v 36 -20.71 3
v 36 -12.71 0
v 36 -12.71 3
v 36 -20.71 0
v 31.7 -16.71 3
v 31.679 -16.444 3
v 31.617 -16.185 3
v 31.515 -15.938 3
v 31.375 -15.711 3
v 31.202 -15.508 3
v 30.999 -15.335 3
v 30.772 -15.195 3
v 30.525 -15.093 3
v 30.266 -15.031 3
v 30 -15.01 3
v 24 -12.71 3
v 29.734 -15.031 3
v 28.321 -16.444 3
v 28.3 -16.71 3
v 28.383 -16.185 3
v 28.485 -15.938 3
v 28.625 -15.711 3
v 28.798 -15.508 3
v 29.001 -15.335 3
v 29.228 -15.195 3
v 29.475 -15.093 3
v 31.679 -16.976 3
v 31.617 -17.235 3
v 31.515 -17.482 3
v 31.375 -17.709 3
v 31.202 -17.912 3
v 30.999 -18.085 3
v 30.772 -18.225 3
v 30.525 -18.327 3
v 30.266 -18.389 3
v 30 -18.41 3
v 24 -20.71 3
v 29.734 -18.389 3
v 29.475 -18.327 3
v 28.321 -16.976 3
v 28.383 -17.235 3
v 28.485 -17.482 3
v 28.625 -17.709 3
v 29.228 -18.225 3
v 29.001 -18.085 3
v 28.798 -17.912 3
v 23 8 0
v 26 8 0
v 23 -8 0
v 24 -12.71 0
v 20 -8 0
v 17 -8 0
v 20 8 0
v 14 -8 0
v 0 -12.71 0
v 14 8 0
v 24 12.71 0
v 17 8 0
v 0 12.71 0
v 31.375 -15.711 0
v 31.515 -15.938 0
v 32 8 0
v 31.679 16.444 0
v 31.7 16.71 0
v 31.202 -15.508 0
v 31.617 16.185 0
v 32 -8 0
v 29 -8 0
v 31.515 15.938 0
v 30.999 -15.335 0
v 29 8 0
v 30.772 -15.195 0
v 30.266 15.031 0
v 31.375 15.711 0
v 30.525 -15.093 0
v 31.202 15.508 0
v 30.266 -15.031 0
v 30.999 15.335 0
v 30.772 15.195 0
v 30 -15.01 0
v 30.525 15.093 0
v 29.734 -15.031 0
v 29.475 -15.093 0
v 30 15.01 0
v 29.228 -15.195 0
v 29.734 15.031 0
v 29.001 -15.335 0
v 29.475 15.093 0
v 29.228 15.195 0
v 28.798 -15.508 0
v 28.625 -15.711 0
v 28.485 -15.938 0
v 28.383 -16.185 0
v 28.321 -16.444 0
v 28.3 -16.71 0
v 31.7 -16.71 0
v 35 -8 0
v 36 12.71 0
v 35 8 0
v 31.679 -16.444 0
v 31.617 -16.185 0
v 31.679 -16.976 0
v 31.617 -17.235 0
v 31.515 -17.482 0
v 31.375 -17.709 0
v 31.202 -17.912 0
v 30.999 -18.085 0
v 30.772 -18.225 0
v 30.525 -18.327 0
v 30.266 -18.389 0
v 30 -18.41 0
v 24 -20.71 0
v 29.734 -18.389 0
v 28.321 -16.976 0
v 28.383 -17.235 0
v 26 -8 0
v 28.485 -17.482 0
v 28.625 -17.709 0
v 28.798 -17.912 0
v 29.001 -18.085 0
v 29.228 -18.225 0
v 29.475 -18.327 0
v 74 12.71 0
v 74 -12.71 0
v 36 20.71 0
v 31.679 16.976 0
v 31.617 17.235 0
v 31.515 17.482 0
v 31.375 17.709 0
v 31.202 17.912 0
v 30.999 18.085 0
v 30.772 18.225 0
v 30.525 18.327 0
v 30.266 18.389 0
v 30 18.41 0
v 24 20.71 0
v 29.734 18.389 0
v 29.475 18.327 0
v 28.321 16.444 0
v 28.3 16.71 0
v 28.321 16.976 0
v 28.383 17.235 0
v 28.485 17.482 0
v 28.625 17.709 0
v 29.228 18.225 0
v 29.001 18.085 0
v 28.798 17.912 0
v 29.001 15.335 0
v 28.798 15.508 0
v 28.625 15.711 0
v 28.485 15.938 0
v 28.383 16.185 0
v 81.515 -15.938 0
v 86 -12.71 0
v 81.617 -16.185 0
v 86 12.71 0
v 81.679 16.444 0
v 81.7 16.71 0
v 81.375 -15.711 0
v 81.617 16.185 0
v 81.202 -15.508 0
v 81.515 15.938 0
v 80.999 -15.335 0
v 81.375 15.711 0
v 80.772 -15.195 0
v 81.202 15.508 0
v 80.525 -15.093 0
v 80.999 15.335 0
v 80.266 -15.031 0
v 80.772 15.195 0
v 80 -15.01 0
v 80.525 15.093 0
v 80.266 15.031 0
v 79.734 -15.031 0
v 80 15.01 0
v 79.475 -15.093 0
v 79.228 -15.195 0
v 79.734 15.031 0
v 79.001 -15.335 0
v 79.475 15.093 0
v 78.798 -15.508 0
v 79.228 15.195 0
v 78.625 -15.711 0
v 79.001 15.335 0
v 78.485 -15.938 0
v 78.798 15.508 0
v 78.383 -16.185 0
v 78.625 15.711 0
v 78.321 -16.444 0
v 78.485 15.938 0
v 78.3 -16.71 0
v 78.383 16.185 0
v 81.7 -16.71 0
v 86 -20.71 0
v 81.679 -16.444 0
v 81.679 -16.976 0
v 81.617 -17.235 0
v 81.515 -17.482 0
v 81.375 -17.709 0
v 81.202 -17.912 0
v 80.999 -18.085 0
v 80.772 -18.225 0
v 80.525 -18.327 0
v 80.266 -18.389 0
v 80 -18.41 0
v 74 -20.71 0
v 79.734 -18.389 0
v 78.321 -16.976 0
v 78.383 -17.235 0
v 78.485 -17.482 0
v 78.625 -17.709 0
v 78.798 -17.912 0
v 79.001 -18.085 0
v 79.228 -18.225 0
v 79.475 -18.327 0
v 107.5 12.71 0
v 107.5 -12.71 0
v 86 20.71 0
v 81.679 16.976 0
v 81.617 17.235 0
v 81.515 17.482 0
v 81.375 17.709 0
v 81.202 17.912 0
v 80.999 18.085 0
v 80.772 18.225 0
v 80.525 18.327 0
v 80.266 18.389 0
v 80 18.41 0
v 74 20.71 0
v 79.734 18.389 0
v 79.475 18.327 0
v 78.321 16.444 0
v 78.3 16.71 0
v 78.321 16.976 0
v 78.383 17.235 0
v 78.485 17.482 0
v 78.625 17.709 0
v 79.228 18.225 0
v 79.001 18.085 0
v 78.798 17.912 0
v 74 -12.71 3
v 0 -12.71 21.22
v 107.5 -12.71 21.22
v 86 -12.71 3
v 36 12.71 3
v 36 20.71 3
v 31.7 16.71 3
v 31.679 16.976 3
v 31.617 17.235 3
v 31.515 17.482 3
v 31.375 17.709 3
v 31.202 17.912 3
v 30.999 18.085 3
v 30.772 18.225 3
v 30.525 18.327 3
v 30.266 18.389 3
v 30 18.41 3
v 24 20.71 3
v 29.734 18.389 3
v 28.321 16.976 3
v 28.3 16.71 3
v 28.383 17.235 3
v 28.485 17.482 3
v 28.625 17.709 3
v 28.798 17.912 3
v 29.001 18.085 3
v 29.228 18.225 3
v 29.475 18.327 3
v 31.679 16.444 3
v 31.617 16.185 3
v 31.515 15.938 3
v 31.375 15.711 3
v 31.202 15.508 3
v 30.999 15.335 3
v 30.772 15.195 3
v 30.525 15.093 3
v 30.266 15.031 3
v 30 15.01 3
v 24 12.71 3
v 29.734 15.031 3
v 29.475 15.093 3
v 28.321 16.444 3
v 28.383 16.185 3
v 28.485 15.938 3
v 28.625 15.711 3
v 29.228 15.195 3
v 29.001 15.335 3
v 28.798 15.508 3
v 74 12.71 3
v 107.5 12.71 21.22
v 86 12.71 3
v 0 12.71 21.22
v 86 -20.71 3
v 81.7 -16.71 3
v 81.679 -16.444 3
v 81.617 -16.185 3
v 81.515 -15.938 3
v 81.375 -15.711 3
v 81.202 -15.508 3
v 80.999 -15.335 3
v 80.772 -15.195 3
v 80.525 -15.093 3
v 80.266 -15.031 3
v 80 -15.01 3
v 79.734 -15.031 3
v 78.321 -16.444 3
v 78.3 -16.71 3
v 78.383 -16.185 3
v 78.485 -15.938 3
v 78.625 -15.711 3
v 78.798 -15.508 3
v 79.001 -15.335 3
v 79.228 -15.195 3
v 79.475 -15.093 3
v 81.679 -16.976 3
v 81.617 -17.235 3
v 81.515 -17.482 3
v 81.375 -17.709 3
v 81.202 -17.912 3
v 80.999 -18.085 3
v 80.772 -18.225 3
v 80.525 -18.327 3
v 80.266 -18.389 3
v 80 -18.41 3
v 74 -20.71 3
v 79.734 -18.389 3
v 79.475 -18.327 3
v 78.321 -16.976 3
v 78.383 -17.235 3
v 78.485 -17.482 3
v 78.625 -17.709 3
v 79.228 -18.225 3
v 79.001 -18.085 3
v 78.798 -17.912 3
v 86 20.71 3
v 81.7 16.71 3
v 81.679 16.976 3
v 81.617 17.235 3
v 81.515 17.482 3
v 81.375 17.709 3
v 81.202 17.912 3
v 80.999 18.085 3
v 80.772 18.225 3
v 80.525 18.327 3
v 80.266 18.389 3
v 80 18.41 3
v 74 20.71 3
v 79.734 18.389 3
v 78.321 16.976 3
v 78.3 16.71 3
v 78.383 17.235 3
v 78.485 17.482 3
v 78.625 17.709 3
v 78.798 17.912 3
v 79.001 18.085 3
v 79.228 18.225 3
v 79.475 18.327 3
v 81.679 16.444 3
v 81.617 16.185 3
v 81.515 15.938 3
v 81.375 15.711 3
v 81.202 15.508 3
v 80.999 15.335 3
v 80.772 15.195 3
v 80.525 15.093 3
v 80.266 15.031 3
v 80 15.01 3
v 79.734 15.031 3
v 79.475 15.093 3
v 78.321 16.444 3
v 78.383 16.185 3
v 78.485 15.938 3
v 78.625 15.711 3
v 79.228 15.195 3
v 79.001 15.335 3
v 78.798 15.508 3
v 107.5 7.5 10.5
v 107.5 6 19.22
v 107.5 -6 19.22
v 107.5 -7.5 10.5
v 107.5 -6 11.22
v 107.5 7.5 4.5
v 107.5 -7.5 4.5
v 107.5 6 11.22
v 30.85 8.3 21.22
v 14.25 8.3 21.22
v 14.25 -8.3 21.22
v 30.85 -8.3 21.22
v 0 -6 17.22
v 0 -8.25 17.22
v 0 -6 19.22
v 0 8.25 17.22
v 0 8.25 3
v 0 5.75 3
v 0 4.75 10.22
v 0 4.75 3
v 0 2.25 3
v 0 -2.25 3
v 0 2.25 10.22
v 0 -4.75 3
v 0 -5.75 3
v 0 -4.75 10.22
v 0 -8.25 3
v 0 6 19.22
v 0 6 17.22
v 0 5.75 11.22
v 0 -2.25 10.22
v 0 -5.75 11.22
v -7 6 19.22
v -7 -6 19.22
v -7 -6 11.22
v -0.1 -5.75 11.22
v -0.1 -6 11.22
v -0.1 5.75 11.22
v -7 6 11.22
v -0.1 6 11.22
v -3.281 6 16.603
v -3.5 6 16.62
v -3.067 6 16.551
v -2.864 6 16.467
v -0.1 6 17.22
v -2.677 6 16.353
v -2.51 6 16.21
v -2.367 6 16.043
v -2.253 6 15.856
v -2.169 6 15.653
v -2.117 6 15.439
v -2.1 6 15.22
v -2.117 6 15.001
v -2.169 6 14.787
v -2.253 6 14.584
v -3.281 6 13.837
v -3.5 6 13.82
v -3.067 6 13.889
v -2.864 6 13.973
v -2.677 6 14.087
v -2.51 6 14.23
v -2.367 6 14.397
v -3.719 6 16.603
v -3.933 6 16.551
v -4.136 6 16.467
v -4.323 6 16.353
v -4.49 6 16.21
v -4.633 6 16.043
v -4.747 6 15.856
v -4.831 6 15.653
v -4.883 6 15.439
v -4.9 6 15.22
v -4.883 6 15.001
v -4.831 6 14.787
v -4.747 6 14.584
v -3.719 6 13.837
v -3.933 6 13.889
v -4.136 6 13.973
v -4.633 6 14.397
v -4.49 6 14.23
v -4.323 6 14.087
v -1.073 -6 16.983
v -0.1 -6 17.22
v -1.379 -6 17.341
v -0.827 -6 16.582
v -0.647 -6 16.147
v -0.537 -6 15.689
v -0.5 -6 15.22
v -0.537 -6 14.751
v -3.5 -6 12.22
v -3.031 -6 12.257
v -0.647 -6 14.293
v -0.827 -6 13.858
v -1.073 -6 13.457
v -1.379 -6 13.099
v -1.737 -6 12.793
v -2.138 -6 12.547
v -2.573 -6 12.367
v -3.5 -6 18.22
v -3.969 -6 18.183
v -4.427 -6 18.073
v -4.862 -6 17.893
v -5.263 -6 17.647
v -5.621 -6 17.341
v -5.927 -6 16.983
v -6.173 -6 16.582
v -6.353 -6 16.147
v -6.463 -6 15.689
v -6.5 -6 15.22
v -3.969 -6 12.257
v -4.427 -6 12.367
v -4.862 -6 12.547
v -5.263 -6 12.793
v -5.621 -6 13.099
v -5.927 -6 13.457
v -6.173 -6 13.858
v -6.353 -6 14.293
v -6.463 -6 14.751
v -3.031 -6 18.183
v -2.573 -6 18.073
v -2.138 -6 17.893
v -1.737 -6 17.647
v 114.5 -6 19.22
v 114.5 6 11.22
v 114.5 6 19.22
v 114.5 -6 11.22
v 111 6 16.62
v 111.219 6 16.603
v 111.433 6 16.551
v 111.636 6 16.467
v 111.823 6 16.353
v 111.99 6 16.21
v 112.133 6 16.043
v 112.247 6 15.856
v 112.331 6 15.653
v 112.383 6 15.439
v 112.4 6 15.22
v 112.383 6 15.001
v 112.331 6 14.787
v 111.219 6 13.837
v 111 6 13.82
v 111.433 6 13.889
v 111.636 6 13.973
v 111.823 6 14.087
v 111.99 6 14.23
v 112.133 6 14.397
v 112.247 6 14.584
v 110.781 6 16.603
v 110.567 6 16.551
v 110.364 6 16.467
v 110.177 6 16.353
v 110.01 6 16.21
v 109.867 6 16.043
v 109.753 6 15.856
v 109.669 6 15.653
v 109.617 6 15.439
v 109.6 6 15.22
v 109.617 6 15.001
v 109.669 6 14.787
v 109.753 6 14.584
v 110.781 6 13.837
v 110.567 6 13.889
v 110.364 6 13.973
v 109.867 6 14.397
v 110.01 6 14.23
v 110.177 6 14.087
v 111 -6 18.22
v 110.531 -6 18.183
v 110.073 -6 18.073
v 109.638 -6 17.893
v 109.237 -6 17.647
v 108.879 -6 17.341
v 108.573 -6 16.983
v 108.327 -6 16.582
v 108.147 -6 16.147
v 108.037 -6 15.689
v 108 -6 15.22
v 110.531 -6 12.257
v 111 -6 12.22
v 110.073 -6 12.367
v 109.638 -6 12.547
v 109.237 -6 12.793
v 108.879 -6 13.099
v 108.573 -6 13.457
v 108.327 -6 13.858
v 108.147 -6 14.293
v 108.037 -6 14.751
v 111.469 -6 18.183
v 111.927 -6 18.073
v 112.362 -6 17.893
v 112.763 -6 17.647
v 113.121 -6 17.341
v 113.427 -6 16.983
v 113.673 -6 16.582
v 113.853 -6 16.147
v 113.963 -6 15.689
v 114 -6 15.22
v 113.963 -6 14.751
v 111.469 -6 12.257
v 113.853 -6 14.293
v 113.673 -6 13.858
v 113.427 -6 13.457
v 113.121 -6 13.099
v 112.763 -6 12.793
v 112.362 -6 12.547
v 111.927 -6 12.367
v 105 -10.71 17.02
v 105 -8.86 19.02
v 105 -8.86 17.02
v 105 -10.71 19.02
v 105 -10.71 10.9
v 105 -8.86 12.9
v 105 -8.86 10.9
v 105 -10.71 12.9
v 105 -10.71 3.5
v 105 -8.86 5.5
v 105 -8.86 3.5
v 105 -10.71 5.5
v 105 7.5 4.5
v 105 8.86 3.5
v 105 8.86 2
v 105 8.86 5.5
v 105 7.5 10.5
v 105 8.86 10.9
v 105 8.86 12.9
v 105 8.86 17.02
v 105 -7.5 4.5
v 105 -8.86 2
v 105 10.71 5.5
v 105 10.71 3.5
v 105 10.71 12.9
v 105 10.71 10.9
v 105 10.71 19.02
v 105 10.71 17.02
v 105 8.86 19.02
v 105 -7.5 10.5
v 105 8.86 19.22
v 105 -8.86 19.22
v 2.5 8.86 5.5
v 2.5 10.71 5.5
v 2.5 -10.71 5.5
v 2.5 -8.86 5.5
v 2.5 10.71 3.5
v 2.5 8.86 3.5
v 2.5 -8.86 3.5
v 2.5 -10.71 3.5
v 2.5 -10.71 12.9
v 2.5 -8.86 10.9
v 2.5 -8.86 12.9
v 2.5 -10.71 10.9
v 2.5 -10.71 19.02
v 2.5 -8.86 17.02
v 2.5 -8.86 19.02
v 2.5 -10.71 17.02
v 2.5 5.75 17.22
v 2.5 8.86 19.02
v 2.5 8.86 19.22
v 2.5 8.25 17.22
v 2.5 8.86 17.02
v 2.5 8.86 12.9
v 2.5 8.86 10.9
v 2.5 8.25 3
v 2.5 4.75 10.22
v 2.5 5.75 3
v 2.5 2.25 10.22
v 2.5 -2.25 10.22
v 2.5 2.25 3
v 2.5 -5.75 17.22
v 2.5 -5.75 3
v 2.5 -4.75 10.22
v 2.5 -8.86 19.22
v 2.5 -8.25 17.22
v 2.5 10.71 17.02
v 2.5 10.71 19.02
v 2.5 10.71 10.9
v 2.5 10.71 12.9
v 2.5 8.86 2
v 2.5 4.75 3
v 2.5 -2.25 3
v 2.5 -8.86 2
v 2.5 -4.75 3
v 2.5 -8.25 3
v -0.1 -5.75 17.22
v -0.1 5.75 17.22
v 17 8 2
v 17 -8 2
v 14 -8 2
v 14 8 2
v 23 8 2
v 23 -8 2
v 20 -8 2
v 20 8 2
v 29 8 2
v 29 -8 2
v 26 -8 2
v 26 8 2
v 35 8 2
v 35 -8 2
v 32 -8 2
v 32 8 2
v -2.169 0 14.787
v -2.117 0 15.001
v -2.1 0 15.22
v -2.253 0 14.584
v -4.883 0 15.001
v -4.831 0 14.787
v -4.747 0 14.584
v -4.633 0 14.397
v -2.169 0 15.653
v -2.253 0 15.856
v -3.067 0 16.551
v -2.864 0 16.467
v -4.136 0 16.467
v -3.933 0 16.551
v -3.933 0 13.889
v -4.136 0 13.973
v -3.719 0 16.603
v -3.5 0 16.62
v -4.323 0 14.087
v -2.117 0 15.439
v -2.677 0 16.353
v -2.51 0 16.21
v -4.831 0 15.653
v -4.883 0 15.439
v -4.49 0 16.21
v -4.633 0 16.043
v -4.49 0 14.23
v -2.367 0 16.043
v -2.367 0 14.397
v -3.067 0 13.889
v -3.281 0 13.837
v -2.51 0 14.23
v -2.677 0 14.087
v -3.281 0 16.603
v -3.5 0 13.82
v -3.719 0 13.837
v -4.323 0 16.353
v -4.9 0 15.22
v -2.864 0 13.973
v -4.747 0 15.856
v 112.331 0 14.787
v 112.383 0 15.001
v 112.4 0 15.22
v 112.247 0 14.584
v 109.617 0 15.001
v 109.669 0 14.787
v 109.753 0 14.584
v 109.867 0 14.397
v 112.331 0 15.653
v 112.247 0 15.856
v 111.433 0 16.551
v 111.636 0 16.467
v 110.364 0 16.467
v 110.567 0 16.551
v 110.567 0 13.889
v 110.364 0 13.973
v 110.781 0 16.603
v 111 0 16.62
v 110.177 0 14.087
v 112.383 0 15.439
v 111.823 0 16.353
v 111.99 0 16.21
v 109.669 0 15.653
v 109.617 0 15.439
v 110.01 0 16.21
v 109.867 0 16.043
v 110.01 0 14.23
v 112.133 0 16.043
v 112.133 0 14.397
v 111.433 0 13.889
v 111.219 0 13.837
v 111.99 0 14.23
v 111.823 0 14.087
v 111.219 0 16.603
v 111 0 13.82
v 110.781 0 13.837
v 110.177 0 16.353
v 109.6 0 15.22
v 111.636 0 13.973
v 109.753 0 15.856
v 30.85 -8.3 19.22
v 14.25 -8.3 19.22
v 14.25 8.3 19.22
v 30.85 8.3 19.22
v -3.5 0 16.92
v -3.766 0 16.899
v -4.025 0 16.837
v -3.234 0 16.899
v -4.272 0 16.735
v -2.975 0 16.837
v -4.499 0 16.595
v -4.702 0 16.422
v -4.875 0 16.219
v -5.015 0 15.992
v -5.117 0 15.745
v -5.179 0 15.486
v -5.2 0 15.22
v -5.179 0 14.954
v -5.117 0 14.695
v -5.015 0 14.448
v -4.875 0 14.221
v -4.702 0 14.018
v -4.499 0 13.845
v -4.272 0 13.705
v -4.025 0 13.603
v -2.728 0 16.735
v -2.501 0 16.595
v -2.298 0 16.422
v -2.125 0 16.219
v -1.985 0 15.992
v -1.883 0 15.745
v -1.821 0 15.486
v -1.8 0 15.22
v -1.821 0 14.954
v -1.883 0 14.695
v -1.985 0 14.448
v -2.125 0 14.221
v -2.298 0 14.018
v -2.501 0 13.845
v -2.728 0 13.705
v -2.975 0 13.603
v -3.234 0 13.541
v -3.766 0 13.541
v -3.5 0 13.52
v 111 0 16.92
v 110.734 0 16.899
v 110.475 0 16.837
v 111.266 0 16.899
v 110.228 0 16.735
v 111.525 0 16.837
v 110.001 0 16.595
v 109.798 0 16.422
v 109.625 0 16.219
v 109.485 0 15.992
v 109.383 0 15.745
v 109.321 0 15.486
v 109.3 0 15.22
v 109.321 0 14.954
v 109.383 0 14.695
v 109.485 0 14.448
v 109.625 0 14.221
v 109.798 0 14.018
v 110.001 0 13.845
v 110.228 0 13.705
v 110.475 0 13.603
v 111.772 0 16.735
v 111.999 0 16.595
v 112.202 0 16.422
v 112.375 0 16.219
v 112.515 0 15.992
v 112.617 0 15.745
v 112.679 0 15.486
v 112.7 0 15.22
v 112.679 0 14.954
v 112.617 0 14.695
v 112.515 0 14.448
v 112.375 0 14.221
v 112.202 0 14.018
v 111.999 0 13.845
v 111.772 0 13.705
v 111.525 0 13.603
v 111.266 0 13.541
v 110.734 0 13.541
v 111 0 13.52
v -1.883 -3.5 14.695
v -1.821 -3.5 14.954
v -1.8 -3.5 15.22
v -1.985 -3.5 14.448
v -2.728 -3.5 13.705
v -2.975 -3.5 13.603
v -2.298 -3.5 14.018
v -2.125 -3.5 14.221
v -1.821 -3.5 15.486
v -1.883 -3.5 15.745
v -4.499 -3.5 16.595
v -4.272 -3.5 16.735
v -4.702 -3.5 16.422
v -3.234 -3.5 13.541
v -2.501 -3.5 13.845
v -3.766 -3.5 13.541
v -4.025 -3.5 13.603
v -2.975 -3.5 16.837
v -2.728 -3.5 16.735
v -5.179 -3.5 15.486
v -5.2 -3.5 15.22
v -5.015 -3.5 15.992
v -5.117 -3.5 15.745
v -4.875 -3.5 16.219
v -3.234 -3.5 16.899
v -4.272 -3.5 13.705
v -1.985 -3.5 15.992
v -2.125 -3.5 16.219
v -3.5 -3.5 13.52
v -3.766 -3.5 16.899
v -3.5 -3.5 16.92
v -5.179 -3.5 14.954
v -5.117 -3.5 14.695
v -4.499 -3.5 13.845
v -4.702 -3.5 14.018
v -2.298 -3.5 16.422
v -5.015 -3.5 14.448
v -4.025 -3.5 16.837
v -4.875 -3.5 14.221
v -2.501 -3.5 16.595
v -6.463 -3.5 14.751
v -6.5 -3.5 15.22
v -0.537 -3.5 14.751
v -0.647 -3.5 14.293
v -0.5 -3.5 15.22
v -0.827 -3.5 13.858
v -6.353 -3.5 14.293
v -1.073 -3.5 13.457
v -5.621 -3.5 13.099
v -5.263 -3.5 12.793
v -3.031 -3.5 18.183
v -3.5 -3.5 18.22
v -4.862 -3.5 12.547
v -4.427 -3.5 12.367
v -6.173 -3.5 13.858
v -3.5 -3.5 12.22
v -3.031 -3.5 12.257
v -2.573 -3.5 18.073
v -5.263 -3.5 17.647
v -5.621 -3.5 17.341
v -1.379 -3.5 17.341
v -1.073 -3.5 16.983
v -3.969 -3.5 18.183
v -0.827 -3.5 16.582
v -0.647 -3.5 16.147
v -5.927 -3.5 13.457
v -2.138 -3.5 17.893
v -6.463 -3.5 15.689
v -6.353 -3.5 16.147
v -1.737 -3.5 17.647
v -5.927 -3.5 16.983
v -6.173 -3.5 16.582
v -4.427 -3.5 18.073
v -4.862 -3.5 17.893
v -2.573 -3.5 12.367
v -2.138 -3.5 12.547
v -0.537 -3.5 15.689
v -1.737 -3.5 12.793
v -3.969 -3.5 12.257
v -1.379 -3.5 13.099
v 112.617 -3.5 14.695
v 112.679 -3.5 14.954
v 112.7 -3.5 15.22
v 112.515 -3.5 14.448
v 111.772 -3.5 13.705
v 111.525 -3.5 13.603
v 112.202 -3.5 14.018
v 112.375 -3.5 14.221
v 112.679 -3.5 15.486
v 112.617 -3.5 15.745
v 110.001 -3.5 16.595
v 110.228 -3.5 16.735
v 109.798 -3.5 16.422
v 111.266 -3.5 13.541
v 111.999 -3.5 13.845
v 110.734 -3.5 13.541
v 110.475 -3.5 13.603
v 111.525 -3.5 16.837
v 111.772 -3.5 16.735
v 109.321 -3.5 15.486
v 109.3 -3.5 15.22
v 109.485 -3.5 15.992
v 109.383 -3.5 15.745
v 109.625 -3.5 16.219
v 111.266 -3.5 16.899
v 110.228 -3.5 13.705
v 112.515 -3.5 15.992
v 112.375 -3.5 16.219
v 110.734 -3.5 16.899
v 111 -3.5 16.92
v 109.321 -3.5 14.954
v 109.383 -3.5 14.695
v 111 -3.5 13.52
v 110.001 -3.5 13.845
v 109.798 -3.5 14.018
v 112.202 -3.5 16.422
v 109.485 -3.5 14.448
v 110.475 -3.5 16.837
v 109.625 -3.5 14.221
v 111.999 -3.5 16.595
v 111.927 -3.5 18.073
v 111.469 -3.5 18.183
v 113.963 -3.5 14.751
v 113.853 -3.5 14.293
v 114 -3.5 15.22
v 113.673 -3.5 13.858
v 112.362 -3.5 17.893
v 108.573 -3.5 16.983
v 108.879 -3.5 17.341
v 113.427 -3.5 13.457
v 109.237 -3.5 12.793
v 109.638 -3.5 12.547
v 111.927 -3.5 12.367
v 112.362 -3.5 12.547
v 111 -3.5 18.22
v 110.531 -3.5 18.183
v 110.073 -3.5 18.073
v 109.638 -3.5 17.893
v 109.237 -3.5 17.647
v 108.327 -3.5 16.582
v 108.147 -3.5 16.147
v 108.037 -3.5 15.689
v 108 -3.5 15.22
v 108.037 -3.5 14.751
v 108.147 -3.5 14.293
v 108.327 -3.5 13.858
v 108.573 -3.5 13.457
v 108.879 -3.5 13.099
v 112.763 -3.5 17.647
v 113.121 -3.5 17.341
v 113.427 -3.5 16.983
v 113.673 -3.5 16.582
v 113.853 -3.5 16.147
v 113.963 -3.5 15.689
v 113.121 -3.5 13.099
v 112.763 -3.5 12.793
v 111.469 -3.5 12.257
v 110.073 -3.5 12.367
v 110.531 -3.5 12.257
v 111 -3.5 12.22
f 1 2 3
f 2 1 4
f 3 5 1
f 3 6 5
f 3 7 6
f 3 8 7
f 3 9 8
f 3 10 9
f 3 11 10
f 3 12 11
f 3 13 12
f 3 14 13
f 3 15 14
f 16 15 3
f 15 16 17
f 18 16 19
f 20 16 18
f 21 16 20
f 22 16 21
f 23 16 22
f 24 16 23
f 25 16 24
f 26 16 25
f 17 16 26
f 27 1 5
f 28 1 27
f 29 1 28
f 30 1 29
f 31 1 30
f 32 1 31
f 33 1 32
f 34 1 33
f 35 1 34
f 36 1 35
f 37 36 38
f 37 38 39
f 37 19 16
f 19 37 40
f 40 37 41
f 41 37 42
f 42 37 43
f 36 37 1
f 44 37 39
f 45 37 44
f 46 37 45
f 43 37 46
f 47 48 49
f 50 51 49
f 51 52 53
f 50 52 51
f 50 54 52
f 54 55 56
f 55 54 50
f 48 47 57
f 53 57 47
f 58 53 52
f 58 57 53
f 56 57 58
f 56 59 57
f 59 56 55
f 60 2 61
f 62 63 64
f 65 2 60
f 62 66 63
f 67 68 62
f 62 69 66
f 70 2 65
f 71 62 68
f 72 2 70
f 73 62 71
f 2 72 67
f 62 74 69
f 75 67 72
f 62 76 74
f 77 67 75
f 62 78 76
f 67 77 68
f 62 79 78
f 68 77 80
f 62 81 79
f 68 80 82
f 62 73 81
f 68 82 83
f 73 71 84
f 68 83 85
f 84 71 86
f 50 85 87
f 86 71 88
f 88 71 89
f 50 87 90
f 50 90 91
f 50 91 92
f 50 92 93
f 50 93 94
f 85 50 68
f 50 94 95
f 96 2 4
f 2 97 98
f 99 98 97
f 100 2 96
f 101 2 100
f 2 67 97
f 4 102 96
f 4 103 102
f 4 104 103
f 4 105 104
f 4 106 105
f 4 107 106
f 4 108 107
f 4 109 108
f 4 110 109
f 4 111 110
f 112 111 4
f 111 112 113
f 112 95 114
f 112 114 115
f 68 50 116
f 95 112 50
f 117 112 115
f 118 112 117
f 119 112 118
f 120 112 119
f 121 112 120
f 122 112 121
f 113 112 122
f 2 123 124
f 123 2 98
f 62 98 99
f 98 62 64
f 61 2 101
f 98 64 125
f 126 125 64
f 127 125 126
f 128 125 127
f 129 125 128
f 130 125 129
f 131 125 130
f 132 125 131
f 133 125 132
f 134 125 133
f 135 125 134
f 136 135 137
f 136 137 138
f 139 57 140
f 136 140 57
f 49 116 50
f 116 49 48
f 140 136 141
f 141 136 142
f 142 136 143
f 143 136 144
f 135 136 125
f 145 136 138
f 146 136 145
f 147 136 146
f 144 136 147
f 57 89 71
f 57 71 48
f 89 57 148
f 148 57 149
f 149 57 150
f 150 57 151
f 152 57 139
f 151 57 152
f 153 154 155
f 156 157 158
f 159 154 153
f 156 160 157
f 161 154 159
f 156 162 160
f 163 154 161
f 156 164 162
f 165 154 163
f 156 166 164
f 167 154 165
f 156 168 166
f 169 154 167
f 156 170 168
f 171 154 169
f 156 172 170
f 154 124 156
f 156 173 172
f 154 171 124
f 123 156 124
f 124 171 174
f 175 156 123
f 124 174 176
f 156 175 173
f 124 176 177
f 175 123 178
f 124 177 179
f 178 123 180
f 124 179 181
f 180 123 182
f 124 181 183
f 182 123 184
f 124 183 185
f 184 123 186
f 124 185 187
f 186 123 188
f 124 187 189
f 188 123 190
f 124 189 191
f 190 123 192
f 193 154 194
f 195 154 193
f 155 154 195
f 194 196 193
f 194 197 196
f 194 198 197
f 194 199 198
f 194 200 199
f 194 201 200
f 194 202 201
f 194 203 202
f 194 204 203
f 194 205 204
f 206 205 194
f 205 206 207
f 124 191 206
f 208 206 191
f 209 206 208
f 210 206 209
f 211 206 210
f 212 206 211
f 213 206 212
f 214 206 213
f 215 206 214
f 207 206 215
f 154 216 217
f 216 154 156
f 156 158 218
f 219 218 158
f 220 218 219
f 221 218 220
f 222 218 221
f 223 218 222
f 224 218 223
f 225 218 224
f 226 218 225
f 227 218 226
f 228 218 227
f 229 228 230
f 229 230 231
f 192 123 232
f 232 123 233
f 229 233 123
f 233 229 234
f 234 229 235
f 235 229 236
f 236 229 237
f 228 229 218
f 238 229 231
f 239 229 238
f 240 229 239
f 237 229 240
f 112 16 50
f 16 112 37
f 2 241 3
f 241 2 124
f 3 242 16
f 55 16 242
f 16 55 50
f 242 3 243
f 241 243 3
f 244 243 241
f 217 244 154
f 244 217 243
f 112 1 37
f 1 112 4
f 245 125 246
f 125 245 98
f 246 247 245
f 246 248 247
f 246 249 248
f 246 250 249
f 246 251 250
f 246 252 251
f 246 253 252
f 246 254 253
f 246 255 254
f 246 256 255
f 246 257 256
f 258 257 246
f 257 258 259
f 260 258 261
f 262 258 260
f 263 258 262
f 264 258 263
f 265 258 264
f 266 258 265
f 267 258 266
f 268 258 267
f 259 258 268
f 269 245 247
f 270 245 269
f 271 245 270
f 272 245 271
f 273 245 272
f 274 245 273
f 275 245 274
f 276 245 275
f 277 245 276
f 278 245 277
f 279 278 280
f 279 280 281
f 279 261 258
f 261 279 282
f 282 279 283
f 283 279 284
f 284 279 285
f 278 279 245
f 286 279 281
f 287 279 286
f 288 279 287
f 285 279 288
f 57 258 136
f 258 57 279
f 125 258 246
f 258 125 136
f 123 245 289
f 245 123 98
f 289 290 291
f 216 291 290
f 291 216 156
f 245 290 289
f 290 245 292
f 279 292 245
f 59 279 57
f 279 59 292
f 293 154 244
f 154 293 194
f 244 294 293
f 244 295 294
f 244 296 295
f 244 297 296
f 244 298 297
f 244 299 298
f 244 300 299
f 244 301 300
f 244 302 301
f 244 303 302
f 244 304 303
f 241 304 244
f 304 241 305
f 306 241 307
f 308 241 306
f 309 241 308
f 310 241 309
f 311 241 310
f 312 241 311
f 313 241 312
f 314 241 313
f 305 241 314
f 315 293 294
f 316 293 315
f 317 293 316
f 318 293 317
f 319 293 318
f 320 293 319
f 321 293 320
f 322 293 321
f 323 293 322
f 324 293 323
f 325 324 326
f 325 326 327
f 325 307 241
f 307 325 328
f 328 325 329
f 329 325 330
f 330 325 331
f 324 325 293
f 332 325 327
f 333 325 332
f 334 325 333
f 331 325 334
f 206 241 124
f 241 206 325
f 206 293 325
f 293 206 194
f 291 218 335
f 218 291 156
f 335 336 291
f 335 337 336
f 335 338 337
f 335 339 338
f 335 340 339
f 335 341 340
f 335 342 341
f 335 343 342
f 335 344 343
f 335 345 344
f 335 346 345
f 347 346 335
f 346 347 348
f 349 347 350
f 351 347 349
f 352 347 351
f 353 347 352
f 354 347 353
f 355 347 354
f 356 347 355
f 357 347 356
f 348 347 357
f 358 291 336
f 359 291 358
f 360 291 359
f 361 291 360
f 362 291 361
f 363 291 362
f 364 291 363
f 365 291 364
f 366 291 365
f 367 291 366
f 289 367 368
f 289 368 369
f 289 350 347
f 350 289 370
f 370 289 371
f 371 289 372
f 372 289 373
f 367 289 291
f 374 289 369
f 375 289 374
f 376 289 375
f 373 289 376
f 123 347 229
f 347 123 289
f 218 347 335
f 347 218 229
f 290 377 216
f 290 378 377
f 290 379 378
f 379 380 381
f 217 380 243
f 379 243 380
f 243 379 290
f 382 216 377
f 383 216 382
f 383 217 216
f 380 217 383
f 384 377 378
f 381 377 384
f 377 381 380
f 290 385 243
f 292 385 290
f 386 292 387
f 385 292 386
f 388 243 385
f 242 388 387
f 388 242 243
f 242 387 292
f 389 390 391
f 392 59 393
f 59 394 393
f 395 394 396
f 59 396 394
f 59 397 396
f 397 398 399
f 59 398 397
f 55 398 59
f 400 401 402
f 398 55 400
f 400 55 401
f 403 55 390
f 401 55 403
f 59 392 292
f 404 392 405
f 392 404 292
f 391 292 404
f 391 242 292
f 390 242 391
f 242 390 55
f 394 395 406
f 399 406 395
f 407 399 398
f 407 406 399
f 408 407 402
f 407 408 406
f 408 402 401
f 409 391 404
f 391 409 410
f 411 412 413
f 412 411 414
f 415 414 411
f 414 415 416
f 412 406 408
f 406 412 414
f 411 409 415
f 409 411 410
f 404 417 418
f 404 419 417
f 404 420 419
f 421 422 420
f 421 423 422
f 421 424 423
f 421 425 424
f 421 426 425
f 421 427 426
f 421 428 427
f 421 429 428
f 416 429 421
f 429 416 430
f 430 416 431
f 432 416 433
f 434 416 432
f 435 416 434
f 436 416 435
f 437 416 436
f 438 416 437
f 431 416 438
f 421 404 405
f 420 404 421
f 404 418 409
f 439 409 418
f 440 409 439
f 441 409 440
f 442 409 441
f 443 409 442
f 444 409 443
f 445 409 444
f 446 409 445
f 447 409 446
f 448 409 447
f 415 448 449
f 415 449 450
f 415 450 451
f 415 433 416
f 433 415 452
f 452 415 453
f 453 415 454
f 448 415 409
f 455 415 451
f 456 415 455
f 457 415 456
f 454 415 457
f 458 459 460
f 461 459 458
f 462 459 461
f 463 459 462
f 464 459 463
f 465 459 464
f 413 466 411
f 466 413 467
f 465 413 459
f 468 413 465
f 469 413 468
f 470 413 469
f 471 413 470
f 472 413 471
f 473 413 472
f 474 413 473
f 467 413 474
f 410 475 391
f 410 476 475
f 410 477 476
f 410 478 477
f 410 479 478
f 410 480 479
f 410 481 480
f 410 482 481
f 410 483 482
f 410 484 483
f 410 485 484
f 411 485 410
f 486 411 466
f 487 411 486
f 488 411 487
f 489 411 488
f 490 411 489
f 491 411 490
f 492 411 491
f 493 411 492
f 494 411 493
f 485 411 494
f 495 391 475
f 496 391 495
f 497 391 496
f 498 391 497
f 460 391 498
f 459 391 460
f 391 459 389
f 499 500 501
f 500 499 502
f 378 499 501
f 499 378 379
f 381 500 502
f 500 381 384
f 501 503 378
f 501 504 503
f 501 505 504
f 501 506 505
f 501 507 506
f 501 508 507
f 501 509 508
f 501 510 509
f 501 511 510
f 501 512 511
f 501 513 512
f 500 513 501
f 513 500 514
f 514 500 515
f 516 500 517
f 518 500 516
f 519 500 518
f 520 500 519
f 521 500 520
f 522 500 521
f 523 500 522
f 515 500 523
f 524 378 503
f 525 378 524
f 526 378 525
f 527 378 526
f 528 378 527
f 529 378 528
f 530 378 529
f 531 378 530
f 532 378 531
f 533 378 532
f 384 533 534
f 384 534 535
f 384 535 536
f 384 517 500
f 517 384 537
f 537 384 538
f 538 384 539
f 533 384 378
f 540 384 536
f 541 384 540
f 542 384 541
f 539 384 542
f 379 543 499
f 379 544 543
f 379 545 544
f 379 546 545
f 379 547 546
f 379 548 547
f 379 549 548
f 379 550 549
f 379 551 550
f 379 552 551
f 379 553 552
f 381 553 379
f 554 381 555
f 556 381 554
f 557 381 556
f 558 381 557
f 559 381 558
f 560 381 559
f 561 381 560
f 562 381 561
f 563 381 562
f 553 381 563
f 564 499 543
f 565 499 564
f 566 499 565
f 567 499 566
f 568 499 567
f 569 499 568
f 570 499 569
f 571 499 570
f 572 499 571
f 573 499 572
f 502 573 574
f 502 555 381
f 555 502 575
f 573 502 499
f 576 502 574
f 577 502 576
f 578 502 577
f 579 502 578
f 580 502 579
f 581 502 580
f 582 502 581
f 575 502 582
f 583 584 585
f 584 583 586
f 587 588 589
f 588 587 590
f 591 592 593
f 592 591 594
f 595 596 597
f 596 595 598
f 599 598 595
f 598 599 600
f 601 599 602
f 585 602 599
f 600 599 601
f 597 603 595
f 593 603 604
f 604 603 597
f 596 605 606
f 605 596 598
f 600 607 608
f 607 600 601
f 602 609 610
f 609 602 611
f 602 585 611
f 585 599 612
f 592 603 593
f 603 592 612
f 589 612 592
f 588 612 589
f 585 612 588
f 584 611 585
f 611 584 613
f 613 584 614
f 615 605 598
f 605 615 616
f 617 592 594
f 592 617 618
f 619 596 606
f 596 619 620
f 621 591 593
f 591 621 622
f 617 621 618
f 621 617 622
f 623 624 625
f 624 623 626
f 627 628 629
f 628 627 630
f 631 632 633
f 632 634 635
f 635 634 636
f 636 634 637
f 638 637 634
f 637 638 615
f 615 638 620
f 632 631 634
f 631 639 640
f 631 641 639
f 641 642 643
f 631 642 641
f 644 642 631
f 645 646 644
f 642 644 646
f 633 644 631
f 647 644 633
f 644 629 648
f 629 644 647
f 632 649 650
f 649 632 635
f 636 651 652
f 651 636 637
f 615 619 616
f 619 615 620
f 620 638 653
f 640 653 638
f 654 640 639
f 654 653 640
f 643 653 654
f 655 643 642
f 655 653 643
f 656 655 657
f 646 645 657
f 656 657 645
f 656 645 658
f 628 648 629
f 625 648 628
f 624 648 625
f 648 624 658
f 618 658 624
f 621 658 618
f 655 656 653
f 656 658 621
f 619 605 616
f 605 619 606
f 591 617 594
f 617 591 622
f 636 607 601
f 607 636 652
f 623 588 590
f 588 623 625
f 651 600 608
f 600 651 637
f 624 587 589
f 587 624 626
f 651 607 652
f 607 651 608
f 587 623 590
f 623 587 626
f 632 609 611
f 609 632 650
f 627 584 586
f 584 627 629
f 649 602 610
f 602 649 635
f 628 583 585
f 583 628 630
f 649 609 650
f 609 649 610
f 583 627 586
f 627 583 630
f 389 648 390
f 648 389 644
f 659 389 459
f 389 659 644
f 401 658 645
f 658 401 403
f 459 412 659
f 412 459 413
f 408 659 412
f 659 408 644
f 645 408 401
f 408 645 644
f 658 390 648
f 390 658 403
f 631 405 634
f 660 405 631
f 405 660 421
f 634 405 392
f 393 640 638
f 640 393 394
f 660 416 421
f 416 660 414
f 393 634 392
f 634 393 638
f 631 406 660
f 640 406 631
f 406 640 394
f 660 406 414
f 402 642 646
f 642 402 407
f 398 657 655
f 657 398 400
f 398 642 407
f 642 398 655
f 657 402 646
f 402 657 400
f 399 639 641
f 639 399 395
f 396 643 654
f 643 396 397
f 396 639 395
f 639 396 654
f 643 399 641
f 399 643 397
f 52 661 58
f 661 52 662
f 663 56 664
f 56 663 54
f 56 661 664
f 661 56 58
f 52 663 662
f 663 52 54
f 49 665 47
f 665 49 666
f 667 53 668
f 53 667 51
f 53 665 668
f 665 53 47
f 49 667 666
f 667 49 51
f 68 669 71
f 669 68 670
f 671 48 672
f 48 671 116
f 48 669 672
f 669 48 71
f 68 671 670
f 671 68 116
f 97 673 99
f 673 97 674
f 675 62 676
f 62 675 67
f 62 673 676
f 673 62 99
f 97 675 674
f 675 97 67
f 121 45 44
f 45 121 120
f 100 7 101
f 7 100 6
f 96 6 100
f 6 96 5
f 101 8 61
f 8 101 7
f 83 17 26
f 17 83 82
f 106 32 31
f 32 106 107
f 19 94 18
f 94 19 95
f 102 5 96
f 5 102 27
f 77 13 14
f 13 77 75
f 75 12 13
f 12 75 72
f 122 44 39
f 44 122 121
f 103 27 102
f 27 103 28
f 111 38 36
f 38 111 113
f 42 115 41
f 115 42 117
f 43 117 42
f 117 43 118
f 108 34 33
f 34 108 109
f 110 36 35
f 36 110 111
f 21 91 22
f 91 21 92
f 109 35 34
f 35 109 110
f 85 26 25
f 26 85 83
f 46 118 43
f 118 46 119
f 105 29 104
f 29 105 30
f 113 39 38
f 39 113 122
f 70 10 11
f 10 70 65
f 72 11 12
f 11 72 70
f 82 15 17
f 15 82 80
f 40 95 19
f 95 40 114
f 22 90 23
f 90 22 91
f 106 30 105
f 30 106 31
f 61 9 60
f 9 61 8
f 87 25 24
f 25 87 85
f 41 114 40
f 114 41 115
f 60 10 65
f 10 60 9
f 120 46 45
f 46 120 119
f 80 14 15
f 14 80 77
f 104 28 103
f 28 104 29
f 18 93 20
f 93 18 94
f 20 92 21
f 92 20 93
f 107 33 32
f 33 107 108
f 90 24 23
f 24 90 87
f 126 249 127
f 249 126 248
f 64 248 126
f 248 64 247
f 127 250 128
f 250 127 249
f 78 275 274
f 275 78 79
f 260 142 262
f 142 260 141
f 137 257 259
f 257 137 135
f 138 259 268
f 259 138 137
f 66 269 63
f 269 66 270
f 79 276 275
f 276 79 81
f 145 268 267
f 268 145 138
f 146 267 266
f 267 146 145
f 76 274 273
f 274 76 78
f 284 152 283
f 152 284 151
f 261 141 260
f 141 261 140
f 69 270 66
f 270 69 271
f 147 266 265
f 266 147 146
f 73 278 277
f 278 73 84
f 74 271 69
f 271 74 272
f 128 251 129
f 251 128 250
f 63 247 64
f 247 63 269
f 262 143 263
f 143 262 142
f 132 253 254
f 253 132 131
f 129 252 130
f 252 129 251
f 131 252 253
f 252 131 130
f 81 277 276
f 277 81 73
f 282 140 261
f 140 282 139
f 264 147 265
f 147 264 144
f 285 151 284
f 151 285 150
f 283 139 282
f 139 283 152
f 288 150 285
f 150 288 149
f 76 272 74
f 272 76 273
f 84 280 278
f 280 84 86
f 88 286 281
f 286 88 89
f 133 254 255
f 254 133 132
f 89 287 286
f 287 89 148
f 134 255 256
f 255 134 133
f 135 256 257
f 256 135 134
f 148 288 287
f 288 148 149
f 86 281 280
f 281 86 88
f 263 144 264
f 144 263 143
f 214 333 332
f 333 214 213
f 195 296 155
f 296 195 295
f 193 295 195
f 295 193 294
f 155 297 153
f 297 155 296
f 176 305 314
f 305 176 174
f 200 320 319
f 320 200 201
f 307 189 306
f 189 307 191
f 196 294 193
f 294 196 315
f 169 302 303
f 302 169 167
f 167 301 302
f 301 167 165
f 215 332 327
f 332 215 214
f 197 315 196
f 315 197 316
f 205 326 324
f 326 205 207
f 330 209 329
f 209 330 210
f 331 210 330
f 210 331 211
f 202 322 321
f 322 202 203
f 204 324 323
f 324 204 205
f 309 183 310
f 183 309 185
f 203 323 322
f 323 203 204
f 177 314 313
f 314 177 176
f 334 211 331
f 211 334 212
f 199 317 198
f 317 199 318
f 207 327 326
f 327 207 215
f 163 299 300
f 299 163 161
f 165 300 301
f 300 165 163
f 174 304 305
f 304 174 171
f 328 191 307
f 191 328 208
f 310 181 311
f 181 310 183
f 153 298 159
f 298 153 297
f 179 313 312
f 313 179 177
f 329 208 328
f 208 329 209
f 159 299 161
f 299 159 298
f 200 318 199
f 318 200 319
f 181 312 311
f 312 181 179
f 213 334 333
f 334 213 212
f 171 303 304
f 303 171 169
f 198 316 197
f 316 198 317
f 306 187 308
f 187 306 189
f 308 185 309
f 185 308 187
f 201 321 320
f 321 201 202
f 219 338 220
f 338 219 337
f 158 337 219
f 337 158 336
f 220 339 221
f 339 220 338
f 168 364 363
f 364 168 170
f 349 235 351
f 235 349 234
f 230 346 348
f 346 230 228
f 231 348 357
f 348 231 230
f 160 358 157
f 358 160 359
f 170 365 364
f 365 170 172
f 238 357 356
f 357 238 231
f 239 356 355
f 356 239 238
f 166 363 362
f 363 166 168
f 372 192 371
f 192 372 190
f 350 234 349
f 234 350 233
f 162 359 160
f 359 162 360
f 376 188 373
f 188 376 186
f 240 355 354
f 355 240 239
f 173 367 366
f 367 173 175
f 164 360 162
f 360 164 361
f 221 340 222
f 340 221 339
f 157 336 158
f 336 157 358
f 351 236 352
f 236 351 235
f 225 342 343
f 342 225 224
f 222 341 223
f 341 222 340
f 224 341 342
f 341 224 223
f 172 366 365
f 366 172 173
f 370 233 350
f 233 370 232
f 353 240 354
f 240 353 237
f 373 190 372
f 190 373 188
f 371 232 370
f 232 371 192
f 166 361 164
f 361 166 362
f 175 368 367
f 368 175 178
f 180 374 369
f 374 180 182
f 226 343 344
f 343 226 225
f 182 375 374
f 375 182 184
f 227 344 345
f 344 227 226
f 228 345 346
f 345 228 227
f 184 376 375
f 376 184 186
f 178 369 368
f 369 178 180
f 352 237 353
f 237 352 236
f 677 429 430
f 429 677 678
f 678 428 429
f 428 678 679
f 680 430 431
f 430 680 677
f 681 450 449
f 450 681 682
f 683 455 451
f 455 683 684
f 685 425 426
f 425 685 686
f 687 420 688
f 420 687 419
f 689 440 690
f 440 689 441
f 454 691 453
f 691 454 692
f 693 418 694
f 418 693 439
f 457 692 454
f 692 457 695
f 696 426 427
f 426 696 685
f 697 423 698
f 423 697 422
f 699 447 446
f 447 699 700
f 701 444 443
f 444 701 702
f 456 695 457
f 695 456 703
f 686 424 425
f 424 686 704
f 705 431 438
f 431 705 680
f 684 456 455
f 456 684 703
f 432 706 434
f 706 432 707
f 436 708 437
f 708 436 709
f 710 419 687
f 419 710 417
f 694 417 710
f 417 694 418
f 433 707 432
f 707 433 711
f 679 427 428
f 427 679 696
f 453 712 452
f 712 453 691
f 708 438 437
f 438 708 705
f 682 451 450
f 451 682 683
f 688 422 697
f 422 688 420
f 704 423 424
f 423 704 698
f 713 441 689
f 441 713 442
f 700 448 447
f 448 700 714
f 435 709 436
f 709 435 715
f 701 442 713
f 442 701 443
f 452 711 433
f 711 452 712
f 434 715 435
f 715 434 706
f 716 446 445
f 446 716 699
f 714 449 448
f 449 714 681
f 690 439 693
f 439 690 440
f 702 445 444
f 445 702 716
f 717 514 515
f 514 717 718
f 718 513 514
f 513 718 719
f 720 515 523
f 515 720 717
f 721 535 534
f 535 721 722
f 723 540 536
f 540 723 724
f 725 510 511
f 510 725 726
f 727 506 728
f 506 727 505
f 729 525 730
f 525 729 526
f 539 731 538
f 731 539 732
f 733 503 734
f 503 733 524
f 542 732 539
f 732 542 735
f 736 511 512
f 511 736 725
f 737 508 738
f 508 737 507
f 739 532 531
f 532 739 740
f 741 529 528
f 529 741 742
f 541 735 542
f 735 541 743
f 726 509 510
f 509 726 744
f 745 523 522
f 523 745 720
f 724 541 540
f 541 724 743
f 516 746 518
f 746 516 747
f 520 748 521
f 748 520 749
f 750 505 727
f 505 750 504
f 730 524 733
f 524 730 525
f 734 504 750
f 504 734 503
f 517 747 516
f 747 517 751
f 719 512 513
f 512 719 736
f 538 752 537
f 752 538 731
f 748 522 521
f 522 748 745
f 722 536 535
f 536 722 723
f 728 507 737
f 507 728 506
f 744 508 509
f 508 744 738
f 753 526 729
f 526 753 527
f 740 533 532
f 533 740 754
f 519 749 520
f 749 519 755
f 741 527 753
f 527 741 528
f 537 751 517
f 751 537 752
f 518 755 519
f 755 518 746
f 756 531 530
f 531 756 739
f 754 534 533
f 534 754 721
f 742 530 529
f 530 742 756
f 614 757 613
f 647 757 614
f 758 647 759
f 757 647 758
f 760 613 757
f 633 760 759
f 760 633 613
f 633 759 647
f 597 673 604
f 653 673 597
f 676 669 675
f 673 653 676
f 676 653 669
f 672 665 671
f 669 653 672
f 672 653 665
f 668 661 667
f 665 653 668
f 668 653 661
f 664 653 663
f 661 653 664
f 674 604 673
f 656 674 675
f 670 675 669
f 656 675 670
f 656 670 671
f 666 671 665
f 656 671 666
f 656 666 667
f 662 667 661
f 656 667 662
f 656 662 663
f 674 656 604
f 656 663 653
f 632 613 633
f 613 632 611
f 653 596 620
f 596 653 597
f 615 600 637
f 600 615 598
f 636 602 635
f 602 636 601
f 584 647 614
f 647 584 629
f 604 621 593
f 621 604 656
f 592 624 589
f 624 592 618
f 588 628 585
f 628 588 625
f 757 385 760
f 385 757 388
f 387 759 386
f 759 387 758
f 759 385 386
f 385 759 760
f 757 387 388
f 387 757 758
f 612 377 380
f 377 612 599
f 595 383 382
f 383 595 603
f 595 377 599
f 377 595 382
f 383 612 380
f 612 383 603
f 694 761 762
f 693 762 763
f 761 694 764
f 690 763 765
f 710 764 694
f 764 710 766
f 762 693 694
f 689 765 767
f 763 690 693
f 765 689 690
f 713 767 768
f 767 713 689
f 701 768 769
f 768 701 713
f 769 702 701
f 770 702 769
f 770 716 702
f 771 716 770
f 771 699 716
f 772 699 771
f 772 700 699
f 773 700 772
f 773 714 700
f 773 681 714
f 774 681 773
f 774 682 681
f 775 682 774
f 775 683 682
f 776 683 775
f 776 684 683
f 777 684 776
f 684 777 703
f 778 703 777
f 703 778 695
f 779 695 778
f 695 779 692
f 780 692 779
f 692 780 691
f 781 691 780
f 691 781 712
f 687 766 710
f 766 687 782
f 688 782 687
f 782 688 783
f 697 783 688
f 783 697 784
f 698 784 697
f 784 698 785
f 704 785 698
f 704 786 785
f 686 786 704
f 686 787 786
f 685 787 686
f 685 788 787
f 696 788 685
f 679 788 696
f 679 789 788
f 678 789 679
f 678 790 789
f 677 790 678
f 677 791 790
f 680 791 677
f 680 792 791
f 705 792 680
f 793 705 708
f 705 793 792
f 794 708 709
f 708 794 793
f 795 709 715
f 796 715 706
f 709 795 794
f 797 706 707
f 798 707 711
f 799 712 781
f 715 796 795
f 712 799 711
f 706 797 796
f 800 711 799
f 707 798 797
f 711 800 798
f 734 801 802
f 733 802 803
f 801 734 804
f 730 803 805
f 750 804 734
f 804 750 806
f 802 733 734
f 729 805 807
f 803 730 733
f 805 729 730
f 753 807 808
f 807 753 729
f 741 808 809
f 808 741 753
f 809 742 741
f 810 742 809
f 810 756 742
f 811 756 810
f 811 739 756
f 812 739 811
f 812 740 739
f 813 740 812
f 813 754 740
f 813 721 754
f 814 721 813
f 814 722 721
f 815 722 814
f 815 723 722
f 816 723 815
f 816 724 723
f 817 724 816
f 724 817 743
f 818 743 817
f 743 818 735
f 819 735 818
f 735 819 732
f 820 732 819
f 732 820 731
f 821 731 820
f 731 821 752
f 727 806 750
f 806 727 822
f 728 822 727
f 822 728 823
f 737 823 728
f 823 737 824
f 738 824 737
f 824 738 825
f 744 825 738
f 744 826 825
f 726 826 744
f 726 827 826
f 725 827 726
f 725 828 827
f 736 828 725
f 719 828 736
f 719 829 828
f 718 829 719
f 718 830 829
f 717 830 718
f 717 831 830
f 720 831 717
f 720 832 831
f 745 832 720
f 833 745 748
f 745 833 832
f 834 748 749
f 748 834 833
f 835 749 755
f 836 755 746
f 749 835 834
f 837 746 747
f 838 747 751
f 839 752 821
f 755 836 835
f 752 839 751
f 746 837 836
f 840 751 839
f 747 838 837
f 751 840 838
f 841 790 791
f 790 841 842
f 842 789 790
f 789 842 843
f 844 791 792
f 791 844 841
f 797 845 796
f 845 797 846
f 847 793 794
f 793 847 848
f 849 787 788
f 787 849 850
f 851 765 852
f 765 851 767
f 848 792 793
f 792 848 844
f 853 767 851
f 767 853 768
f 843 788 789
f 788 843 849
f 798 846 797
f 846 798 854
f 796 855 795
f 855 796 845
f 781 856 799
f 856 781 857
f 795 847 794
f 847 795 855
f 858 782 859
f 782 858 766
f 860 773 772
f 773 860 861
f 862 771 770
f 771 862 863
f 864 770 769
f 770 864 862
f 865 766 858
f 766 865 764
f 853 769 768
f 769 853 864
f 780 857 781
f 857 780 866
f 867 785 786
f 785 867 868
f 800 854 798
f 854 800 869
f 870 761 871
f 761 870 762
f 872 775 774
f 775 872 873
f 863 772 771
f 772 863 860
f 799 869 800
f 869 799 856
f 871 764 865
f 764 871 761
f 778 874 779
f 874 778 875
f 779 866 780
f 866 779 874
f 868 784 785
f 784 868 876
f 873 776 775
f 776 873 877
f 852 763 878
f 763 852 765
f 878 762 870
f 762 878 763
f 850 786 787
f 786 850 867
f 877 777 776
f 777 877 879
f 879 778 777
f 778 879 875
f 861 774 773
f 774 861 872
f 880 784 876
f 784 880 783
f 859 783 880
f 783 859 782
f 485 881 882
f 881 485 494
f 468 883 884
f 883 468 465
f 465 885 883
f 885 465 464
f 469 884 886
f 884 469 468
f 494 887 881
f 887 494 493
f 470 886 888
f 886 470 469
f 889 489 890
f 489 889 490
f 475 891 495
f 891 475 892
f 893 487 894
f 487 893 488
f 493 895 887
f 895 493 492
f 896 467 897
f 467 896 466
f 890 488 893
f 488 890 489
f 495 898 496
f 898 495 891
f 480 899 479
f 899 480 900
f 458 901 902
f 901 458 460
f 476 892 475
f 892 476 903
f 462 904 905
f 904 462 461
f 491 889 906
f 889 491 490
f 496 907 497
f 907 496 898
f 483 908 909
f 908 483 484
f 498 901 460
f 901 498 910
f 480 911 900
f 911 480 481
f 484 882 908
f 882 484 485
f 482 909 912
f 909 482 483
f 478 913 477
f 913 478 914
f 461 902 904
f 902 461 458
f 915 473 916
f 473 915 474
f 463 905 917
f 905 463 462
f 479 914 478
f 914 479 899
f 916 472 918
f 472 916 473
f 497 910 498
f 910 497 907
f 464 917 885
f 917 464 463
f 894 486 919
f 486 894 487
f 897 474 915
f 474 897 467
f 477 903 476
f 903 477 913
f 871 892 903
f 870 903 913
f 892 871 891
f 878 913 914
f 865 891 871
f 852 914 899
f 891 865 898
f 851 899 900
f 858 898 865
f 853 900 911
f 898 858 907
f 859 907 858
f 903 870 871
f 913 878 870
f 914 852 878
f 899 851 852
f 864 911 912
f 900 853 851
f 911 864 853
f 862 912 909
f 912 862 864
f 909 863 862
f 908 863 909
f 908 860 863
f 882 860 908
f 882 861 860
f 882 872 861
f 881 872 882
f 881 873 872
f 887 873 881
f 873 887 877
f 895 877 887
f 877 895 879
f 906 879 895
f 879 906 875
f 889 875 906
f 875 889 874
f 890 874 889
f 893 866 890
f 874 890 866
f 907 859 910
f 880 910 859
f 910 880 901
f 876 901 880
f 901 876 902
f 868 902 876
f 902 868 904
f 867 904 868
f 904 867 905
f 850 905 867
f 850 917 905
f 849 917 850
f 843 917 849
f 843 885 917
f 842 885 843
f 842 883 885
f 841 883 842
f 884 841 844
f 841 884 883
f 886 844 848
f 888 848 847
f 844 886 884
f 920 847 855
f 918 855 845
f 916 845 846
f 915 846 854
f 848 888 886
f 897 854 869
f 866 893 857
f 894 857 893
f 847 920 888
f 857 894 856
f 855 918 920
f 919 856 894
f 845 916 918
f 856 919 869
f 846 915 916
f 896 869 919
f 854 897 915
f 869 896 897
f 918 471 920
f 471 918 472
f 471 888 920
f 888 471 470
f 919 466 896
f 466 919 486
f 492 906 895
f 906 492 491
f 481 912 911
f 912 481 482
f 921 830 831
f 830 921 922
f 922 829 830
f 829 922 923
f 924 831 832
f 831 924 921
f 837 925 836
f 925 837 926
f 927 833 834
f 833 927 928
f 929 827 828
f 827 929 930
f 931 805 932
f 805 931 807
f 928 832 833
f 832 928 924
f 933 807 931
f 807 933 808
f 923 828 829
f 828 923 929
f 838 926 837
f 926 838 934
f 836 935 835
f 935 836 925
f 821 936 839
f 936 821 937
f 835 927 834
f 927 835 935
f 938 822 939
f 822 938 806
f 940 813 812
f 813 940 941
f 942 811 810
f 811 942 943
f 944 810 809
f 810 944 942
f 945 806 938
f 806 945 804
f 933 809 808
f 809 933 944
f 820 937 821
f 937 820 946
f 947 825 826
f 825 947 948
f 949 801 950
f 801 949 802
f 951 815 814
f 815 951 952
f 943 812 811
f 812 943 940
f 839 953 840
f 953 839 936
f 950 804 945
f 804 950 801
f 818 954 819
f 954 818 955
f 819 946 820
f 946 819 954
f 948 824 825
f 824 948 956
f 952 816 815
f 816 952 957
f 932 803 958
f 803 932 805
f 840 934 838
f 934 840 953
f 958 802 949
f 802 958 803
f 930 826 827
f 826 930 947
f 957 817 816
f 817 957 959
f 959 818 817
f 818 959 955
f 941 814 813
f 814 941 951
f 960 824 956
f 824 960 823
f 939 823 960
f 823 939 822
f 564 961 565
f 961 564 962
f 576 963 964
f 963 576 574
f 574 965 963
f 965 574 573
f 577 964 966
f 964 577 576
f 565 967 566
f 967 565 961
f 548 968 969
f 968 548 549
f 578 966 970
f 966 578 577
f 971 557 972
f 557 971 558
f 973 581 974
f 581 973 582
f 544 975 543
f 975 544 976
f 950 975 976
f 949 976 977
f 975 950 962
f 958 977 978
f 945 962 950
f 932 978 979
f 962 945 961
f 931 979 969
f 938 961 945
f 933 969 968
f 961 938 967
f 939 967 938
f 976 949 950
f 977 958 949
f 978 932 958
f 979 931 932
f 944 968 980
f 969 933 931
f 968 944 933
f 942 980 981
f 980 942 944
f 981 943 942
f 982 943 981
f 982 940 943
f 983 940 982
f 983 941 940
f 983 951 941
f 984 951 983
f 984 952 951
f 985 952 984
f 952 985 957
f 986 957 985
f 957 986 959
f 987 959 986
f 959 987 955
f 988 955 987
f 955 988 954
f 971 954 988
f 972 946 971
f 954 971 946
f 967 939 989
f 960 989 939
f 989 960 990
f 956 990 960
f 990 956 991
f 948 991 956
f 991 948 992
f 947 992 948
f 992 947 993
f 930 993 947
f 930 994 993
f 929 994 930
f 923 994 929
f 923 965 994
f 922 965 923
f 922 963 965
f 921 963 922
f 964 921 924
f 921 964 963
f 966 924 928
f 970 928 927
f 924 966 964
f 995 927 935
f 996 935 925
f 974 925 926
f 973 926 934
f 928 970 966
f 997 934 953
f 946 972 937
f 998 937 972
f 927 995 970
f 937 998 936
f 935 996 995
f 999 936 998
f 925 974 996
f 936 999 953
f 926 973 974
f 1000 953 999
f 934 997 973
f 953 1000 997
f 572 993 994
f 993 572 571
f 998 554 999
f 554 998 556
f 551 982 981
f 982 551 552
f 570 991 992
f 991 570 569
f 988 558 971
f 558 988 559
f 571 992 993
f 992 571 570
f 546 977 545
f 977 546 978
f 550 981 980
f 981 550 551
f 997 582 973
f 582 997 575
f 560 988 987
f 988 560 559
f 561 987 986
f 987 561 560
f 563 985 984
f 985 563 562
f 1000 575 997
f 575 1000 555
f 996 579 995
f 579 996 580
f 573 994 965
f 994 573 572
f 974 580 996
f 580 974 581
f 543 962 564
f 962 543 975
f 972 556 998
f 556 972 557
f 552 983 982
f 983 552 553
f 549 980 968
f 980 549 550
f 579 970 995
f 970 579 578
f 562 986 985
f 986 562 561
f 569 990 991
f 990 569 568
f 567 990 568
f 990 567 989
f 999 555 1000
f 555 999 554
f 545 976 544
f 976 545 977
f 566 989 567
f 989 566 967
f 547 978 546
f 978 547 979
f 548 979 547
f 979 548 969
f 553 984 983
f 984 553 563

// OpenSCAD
// ============================================================================
// CyberWing — CO sensor CLAMSHELL CARD CAGE (SPEC 3-board stick)
// The stick is 3 detachable boards on header plugs (CP2102 USB / D-ULPSM AFE /
// SPEC PSCB cell). Vertical-split clamshell: each half-shell carries 3 groove
// tiers; the assembled stack LAYS IN sideways (no sliding stress on the header
// joints), the second half closes over, 2× M3 screws through end lugs.
// Crack it open to swap any single layer (the cell board is the consumable).
//   X = length (cell end x=0, USB +X) ; Y = split at 0 ; Z = up.
// Cell module + membrane face UP through an open ceiling window. Vented cell
// end + floor. Print halves seam-face down (no supports).
// part = "A" (screw-head half) | "B" (pilot half) | "both" (assembled view)
// ============================================================================
$fn = 40;
part = "both";

// ---- measured stack ----
PCB_W = 20.92; PCB_T = 1.6;
GAP1 = 5.80;                // USB board -> AFE (measured)
GAP2 = 4.52;                // AFE -> cell board (derived from 15.12; CONFIRM)
CELL_X = 19.80;             // cell module center from the cell end
MOD_SQ = 15.58;             // black cell module side
PLUG_PROT = 12;             // USB-A metal beyond the board end (std; CONFIRM)
STICK_L = 114.00;           // overall incl. plug

// ---- cage ----
ENG = 1.6; WALL = 2.0; FLOOR = 2.0; TOP = 2.0; END = 2.5;
FLR_GAP = 1.5; SLOT_H = PCB_T + 0.4; CEIL_CLR = 0.6;
WIN = 16.6;                 // ceiling window over the module
USB_W = 15; USB_H = 6;      // end aperture (plug passes, boards can't)
EAR_X = [30, 80]; M3 = 3.4;

// ---- derived ----
b1 = FLR_GAP;                       // USB board bottom
b2 = b1 + PCB_T + GAP1;             // AFE bottom
b3 = b2 + PCB_T + GAP2;             // cell board bottom
IH = b3 + PCB_T + CEIL_CLR;
OH = FLOOR + IH + TOP;
RIBY = PCB_W/2 - ENG;               // rib inner face
GFLR = PCB_W/2 + 0.25;              // groove floor
OW = 2*(GFLR + WALL);
CAV_L = STICK_L - PLUG_PROT + 0.5;  // boards only; plug exits the end wall
OL = END + CAV_L + END;
x_cell = END + 0.25 + CELL_X;
lugs = [[-3.5, OH-6], [OL+3.5, OH-6]];   // [x, z] screw centers, both ends up top

module shell() {
  difference() {
    union() {
      translate([0, -OW/2, 0]) cube([OL, OW, OH]);                      // body
      translate([-7, -6, OH-10]) cube([7, 12, 8]);                      // -X lug
      translate([OL, -6, OH-10]) cube([7, 12, 8]);                      // +X lug
      for (x = EAR_X, sy = [-1,1])                                      // 4 ears
        translate([x-6, sy>0 ? OW/2 : -OW/2-8, 0]) cube([12, 8, 3]);
    }
    translate([END, -RIBY, FLOOR]) cube([CAV_L, 2*RIBY, IH]);           // cavity between ribs
    for (tb = [b1, b2, b3])                                             // 3 groove tiers
      translate([END, -GFLR, FLOOR+tb]) cube([CAV_L, 2*GFLR, SLOT_H]);
    translate([x_cell-WIN/2, -WIN/2, FLOOR+IH-0.1])                     // open cell window
      cube([WIN, WIN, TOP+0.2]);
    translate([OL-END-0.1, -USB_W/2, FLOOR+b1+PCB_T-0.6])               // USB aperture
      cube([END+0.2, USB_W, USB_H]);
    for (vy = [-7, 7])                                                  // outer cell-end vents (full height, beside the lug)
      translate([-0.1, vy-1.25, FLOOR+1]) cube([END+0.2, 2.5, IH-3]);
    for (vy = [-3.5, 3.5])                                              // inner vents stop below the lug — solid wall behind the screw boss
      translate([-0.1, vy-1.25, FLOOR+1]) cube([END+0.2, 2.5, (OH-11)-(FLOOR+1)]);
    for (vx = [14, 20, 26, 32])                                         // floor vents under the cell
      translate([vx, -8, -0.1]) cube([3, 16, FLOOR+0.2]);
    for (x = EAR_X, sy = [-1,1])                                        // ear M3
      translate([x, sy*(OW/2+4), -0.1]) cylinder(d=M3, h=3.2);
    for (p = lugs)                                                      // lug pilots (M3 self-tap in B)
      translate([p[0], -6.1, p[1]]) rotate([-90,0,0]) cylinder(d=2.8, h=12.2);
  }
}

module halfA() {                       // y<0, screw heads
  difference() {
    intersection() { shell(); translate([-60,-60,-5]) cube([OL+120, 60, OH+20]); }
    for (p = lugs) {
      translate([p[0], -6.1, p[1]]) rotate([-90,0,0]) cylinder(d=M3, h=6.2);      // clearance
      translate([p[0], -6.1, p[1]]) rotate([-90,0,0]) cylinder(d=6, h=2.6);       // head cb
    }
  }
}
module halfB() intersection() { shell(); translate([-60,0,-5]) cube([OL+120, 60, OH+20]); }

if (part=="both") { color("SteelBlue") halfA(); color("LightGreen") halfB(); }
if (part=="A") rotate([-90,0,0]) halfA();     // seam-face down for printing
if (part=="B") rotate([90,0,0])  halfB();
